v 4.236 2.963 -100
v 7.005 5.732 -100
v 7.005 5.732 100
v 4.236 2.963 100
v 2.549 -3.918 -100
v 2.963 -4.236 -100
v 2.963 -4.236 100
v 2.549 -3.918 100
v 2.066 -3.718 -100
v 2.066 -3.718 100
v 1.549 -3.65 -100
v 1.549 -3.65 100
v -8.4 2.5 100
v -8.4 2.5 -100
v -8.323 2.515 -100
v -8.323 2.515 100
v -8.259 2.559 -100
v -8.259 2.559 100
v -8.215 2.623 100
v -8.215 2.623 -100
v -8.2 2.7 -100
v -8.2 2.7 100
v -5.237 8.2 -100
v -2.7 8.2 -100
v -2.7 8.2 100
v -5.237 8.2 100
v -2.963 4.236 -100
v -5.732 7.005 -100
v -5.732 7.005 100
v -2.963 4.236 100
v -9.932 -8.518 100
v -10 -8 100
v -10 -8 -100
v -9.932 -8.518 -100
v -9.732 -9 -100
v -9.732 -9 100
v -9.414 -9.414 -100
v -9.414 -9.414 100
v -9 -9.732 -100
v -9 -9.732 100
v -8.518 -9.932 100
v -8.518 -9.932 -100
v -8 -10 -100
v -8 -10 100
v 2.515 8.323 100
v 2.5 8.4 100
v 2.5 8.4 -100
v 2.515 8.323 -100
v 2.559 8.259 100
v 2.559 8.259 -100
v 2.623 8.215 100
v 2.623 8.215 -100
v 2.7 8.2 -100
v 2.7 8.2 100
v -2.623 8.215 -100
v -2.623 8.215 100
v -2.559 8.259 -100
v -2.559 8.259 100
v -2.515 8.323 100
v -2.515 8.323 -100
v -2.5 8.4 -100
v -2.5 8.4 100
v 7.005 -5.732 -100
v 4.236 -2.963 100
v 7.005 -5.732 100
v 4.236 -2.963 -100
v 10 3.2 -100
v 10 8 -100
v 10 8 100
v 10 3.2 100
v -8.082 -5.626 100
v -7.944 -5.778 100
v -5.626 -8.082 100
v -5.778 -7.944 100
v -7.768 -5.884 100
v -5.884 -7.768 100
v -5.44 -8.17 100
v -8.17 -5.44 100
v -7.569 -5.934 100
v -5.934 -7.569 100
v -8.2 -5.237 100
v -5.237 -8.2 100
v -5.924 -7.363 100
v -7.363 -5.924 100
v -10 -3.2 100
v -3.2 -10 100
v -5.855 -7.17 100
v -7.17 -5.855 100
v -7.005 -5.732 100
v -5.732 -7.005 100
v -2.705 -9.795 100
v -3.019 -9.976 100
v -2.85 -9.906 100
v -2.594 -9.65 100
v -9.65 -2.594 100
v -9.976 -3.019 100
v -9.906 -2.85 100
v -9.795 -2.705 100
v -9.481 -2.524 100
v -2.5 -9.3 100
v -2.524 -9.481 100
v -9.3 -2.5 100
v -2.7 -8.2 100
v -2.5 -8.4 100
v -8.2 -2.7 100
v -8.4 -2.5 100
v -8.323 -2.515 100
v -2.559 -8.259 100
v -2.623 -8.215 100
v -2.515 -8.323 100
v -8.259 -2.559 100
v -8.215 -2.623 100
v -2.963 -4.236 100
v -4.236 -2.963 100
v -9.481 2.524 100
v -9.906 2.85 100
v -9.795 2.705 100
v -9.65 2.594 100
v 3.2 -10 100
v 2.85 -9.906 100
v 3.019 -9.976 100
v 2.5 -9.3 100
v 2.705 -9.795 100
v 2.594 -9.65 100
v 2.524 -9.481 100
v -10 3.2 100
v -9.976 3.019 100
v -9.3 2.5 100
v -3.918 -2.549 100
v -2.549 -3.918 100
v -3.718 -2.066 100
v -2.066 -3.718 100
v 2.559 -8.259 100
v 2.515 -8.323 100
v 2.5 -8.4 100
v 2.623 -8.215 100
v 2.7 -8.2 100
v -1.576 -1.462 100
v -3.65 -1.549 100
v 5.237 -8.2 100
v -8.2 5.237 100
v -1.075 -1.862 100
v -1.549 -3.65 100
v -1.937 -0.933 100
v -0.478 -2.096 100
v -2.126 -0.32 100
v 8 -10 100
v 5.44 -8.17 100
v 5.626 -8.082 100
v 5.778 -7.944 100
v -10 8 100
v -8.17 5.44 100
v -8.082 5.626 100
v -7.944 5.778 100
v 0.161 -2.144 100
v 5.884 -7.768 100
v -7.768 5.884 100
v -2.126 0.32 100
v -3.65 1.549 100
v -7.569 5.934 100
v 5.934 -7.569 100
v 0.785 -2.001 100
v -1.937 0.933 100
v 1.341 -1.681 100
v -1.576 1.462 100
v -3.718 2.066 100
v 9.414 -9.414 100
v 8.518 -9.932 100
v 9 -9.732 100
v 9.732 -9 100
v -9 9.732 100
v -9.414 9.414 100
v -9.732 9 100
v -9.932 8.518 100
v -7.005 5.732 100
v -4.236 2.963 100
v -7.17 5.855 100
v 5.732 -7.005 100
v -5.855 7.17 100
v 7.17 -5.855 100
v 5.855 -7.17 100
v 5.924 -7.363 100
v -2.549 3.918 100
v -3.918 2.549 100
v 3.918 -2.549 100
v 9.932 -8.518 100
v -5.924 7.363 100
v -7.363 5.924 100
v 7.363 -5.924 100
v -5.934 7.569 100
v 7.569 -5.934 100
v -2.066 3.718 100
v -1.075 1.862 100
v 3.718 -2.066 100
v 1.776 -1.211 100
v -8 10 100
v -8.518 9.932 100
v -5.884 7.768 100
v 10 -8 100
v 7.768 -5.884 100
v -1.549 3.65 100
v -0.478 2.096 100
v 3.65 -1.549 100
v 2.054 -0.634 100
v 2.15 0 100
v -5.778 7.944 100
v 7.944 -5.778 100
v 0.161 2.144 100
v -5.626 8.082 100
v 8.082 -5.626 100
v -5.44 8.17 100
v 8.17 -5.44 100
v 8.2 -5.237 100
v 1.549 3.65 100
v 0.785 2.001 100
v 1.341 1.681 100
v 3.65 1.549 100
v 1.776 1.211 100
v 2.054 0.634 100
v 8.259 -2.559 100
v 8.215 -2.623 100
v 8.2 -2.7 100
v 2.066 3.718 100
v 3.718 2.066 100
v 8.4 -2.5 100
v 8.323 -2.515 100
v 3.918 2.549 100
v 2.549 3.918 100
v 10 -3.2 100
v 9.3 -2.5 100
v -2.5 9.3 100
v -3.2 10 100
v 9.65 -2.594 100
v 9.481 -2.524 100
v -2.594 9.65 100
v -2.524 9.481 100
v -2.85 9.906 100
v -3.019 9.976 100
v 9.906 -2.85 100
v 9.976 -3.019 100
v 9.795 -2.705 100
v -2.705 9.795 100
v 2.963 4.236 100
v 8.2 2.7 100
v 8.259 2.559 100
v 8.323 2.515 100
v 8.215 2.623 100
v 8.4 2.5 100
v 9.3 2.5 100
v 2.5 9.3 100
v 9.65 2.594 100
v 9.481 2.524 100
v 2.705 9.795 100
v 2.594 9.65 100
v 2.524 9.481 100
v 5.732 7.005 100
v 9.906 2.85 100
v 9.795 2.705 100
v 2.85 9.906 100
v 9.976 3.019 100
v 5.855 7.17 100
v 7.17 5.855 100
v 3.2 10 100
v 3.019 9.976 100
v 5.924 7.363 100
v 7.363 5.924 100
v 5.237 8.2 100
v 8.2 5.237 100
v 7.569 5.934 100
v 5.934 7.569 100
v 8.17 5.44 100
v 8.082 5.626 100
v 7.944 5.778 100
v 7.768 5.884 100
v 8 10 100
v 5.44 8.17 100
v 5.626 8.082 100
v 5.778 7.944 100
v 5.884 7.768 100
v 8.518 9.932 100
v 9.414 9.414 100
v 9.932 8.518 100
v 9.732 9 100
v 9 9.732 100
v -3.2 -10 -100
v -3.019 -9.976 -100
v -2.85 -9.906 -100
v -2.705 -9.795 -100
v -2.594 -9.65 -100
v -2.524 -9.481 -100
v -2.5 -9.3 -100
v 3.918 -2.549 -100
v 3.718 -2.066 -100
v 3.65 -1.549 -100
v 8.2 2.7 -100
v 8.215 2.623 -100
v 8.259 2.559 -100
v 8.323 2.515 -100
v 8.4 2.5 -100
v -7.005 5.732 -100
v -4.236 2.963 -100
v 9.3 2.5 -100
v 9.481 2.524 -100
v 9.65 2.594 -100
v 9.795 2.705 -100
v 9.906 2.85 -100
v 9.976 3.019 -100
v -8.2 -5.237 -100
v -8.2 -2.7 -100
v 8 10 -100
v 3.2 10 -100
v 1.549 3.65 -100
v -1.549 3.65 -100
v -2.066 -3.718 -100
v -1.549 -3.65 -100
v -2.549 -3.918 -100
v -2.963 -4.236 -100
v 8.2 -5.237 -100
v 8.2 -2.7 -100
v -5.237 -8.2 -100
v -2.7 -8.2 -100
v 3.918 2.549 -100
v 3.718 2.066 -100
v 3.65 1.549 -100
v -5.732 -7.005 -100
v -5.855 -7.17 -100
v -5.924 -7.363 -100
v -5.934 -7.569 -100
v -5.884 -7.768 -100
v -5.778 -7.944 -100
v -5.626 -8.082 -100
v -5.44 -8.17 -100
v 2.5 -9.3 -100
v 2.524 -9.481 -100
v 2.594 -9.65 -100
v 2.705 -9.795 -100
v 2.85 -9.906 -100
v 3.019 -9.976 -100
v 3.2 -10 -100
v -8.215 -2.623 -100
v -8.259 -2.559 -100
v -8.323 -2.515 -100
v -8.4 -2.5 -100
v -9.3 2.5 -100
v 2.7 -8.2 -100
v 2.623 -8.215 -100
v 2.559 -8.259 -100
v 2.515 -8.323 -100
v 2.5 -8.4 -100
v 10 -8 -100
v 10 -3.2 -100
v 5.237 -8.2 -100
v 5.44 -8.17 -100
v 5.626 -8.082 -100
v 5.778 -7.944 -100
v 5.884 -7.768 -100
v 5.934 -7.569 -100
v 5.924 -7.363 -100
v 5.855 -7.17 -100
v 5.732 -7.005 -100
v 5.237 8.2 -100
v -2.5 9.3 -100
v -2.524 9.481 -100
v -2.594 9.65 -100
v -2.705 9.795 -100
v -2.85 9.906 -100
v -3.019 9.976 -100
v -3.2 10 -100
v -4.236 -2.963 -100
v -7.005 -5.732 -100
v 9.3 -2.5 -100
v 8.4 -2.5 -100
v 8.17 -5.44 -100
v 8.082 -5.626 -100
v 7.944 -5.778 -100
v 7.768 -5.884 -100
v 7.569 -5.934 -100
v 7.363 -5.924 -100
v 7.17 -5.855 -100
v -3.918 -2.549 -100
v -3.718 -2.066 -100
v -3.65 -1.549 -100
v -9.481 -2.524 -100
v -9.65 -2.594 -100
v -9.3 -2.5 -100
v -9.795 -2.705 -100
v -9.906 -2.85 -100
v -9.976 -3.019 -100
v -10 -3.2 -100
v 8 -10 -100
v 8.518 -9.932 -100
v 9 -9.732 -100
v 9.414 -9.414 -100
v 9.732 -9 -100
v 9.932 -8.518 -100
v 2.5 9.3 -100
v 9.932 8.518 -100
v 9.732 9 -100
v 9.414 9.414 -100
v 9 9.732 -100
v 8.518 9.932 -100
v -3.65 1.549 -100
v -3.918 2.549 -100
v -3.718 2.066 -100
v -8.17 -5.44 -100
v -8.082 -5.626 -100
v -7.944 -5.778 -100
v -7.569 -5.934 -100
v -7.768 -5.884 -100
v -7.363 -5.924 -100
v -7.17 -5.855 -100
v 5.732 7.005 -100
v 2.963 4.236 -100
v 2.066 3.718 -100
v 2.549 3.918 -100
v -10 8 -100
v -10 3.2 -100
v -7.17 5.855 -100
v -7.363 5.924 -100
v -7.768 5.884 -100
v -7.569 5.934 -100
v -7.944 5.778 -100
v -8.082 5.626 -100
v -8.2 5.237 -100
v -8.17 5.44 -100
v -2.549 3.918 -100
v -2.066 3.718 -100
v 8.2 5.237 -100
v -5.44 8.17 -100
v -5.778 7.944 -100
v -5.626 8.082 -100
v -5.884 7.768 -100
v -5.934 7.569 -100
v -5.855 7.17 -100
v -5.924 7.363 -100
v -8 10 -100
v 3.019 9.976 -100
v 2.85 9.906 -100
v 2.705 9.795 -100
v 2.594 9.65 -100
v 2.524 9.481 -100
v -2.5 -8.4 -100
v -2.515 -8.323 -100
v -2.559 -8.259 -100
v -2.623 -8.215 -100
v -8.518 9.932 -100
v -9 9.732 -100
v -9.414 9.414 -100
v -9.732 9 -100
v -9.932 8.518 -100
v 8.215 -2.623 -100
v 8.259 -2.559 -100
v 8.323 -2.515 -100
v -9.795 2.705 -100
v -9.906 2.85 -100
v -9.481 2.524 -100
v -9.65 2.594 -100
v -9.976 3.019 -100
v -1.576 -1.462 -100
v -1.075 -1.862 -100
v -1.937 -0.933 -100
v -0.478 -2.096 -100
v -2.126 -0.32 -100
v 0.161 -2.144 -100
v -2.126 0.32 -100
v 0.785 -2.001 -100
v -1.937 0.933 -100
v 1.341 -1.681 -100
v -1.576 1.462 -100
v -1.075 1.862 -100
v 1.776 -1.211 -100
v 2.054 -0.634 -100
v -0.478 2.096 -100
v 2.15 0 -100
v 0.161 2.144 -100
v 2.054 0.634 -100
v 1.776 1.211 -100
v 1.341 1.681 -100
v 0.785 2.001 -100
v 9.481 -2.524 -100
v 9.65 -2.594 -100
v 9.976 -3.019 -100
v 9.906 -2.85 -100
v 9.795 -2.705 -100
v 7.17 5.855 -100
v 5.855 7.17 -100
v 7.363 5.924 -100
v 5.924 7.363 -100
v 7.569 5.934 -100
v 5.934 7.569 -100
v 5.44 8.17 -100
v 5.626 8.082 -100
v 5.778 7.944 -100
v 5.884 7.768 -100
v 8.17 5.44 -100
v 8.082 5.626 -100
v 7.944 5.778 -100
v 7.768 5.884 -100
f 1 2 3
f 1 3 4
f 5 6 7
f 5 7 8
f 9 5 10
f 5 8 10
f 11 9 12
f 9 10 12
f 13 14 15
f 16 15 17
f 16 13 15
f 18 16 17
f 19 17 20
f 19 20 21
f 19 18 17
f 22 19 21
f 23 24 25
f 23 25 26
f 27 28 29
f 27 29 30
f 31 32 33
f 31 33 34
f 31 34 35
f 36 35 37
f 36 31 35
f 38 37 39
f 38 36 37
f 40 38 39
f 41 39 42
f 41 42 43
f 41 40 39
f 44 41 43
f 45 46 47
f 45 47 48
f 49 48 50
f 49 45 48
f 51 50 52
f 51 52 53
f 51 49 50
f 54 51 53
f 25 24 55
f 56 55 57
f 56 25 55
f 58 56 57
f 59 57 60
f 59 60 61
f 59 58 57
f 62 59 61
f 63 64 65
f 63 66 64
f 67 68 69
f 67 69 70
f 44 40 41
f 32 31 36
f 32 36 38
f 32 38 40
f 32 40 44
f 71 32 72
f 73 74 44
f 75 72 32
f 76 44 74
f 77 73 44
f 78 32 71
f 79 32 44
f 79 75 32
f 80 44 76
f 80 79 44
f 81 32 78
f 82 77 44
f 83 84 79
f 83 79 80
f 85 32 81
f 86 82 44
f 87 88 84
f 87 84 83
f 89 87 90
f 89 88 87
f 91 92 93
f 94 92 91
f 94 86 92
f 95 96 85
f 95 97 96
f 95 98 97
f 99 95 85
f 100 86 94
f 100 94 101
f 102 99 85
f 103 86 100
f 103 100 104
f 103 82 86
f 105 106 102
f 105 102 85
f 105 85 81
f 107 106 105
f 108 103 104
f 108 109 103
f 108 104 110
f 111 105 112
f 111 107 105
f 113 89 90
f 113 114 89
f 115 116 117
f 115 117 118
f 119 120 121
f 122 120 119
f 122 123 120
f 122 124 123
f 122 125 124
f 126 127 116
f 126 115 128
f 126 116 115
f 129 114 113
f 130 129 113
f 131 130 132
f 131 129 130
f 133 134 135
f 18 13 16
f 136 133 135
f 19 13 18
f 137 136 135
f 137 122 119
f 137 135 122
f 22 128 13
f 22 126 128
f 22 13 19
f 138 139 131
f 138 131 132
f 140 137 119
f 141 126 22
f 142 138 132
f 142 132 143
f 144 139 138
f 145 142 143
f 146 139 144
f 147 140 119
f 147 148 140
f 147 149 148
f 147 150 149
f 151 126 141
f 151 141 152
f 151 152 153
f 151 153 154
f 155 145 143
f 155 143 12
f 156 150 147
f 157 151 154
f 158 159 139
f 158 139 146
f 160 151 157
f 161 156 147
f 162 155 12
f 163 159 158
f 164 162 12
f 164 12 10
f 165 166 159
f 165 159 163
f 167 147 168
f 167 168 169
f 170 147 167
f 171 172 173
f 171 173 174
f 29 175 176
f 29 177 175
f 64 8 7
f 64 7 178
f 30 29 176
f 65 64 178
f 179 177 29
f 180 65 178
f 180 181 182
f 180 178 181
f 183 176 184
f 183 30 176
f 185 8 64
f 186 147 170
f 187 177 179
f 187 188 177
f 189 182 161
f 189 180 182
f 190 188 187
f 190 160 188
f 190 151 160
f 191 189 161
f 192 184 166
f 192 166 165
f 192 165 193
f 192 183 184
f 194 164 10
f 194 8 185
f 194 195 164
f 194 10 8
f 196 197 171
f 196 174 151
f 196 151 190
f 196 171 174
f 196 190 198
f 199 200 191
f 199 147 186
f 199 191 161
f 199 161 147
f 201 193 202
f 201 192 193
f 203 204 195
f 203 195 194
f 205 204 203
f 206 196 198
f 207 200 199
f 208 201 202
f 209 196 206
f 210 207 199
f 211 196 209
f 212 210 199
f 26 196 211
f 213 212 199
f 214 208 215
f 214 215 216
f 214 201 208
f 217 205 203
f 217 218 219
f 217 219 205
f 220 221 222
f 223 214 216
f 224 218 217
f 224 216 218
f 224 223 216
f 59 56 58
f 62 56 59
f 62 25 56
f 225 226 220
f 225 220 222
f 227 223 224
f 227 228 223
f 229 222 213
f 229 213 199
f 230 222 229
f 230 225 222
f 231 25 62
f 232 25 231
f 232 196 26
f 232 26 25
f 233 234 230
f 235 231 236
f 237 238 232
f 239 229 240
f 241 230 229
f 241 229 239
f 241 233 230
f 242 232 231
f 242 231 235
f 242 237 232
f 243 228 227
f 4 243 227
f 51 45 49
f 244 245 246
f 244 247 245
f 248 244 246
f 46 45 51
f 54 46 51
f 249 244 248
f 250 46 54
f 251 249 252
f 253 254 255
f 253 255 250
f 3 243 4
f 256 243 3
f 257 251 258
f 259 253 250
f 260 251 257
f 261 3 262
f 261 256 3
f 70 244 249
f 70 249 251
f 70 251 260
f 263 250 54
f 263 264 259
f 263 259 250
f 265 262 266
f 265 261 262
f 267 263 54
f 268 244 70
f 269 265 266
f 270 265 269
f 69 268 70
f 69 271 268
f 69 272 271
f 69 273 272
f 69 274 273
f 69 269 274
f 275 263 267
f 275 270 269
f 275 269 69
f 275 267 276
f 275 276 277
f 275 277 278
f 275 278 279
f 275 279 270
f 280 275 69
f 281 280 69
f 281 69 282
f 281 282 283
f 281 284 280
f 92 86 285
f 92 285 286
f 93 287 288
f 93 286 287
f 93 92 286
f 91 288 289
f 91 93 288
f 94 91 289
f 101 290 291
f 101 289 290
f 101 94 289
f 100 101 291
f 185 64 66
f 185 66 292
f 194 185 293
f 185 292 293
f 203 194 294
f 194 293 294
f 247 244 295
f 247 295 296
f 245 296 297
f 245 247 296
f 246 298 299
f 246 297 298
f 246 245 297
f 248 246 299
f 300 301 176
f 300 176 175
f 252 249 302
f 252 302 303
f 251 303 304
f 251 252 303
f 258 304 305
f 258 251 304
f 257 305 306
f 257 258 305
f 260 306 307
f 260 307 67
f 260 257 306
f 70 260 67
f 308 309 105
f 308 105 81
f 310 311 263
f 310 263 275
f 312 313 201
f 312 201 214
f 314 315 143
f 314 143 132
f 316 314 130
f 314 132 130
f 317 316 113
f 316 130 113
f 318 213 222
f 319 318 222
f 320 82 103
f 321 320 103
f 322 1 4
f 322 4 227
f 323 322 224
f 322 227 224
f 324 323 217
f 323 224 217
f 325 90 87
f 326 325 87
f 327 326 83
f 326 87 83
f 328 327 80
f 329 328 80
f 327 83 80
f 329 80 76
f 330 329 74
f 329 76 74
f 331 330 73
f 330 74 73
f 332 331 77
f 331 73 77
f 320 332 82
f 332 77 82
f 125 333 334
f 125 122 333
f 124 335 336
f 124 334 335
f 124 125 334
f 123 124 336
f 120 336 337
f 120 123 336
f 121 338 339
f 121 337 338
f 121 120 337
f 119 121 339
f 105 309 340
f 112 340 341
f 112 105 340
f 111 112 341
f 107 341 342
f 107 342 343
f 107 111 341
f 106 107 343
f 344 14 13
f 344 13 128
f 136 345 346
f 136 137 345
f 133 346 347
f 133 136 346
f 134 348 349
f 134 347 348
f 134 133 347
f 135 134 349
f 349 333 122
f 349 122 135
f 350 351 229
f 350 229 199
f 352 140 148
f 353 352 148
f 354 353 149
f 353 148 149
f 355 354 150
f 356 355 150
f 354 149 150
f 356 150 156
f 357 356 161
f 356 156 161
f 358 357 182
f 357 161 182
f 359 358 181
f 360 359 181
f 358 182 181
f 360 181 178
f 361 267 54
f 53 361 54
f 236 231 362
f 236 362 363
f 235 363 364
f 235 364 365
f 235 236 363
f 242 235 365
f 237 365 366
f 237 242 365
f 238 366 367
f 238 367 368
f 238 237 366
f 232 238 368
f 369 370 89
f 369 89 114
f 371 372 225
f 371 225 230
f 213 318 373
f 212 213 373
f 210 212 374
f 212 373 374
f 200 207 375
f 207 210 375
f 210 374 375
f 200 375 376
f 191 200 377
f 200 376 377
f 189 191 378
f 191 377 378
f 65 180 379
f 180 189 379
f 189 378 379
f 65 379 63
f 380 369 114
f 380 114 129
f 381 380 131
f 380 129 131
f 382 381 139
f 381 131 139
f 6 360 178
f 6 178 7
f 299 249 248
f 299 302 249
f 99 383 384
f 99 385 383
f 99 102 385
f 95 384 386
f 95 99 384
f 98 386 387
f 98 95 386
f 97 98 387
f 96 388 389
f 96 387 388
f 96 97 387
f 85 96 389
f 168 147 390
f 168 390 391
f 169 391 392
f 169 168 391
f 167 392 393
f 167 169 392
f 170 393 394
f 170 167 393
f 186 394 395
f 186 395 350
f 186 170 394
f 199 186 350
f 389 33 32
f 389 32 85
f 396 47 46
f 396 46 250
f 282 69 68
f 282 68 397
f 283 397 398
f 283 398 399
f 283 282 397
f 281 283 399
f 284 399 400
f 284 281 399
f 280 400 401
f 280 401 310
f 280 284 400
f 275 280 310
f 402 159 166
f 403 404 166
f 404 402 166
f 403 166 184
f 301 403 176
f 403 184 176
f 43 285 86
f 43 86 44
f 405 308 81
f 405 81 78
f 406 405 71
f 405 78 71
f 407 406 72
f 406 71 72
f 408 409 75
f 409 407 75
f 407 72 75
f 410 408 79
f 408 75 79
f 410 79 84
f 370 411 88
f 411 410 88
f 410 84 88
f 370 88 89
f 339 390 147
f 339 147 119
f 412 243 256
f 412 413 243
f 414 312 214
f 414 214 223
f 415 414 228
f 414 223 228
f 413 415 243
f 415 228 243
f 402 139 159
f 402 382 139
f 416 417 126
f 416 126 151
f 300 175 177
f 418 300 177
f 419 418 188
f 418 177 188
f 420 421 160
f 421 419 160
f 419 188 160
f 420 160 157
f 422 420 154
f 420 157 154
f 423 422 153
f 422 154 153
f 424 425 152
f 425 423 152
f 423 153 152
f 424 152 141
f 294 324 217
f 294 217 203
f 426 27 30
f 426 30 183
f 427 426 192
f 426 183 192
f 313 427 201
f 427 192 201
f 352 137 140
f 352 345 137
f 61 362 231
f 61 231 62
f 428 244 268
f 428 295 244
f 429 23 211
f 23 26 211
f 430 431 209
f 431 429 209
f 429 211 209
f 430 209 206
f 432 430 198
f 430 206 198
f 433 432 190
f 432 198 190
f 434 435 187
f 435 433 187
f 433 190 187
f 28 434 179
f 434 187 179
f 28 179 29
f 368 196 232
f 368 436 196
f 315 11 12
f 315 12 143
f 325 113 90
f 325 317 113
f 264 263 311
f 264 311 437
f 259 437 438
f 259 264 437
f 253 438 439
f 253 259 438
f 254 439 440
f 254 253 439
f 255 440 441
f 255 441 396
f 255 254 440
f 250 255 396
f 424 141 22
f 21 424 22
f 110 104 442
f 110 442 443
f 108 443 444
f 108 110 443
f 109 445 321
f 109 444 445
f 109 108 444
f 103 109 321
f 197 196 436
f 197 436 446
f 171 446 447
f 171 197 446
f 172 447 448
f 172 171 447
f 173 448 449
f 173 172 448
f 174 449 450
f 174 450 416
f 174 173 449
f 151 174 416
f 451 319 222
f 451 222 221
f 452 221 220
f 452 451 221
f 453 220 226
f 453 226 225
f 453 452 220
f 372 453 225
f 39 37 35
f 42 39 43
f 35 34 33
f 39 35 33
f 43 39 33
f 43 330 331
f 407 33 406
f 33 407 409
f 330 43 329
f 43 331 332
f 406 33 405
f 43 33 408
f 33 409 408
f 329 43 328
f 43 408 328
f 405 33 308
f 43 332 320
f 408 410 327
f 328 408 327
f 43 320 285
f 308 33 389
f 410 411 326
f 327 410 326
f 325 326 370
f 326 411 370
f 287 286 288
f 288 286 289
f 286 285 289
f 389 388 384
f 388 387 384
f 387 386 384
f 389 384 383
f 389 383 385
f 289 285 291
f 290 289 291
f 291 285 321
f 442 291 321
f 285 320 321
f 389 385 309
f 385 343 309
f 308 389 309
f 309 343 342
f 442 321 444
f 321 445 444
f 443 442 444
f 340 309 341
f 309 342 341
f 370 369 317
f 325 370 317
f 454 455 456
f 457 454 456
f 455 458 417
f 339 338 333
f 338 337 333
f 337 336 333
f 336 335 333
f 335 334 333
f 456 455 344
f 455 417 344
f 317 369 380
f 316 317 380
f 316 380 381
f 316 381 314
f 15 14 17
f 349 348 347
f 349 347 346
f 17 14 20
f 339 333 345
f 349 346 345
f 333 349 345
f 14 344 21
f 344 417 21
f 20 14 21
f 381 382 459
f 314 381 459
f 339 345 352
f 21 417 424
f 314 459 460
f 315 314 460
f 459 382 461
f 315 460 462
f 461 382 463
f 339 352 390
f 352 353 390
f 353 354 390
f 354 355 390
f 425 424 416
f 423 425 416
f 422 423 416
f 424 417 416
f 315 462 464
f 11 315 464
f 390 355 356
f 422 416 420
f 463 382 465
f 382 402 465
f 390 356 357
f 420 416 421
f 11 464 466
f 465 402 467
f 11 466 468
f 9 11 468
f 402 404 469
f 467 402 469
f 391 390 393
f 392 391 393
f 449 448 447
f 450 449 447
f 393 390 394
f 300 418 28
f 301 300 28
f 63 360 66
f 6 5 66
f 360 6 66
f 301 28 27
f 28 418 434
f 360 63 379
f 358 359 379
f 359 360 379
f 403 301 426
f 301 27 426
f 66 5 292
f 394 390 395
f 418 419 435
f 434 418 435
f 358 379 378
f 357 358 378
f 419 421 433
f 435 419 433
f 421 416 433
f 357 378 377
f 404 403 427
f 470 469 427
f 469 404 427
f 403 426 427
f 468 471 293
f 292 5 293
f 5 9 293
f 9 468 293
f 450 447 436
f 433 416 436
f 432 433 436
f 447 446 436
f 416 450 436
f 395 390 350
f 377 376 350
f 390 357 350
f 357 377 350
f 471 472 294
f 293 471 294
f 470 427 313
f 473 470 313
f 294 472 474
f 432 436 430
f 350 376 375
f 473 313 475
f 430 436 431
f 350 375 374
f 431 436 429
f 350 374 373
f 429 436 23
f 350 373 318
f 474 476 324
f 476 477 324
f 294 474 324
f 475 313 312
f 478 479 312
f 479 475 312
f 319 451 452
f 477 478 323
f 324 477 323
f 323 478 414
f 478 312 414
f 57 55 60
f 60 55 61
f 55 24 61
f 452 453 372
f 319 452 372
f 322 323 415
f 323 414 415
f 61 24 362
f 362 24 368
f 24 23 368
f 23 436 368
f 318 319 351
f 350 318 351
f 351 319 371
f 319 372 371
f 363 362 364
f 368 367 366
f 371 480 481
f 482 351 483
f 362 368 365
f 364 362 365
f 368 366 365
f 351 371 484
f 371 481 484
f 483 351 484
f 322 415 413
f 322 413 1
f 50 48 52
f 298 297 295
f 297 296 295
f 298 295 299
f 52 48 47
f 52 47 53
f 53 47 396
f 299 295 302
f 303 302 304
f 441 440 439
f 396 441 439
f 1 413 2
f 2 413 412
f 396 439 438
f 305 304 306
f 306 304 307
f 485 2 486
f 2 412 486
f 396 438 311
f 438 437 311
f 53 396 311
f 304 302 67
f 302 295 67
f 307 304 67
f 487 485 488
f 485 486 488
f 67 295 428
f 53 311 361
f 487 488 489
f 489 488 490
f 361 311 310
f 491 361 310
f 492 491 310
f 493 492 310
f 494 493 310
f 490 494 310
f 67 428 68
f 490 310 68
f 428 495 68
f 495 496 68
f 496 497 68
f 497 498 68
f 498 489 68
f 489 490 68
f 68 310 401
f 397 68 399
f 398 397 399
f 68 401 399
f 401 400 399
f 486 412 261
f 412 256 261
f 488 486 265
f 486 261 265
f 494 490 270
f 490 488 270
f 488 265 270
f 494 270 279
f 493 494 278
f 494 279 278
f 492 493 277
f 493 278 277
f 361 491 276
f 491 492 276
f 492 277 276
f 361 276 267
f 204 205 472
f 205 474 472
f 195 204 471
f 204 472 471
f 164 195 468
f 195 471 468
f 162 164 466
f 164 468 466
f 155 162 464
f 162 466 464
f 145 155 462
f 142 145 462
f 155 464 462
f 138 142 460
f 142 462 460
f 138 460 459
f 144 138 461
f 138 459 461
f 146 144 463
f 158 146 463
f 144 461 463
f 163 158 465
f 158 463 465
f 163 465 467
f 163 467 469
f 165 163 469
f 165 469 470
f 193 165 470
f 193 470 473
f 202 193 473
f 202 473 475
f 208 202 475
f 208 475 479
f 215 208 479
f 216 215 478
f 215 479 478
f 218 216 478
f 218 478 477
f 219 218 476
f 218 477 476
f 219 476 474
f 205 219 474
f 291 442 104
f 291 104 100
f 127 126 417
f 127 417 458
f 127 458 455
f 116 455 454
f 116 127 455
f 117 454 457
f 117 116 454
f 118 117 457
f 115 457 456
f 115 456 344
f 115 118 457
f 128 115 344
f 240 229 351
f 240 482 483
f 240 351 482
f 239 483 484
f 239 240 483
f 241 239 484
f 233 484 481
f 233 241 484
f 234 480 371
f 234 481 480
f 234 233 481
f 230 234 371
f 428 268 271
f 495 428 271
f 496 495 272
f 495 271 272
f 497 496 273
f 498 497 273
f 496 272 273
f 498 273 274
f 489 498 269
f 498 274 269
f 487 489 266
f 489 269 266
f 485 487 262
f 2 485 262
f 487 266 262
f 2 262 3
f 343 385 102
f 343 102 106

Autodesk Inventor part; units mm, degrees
ref_plane "YZ Plane" through (0, 0, 0) normal (1, 0, 0) x (0, 1, 0)
ref_plane "XZ Plane" through (0, 0, 0) normal (0, 1, 0) x (-1, 0, 0)
ref_plane "XY Plane" through (0, 0, 0) normal (0, 0, 1) x (1, 0, 0)
sketch "Sketch1" plane through (0, 0, 0) normal (0, 0, 1) x (1, 0, 0)
  circle A0 centre (0, 0) radius 2.15
  line L0 (-10, 10) -> (-2.5, 10)
  line L1 (-2.5, 10) -> (-2.5, 8.2)
  line L2 (-2.5, 8.2) -> (-6.9272, 8.2)
  line L3 (-6.9272, 8.2) -> (-2.3772, 3.65)
  line L4 (-2.3772, 3.65) -> (2.3772, 3.65)
  line L5 (2.3772, 3.65) -> (6.9272, 8.2)
  line L6 (6.9272, 8.2) -> (2.5, 8.2)
  line L7 (2.5, 8.2) -> (2.5, 10)
  line L8 (2.5, 10) -> (10, 10)
  line L9 (10, 10) -> (10, 2.5)
  line L10 (10, 2.5) -> (8.2, 2.5)
  line L11 (8.2, 2.5) -> (8.2, 6.9272)
  line L12 (8.2, 6.9272) -> (3.65, 2.3772)
  line L13 (3.65, 2.3772) -> (3.65, -2.3772)
  line L14 (3.65, -2.3772) -> (8.2, -6.9272)
  line L15 (8.2, -6.9272) -> (8.2, -2.5)
  line L16 (8.2, -2.5) -> (10, -2.5)
  line L17 (10, -2.5) -> (10, -10)
  line L18 (10, -10) -> (2.5, -10)
  line L19 (2.5, -10) -> (2.5, -8.2)
  line L20 (2.5, -8.2) -> (6.9272, -8.2)
  line L21 (6.9272, -8.2) -> (2.3772, -3.65)
  line L22 (2.3772, -3.65) -> (-2.3772, -3.65)
  line L23 (-2.3772, -3.65) -> (-6.9272, -8.2)
  line L24 (-6.9272, -8.2) -> (-2.5, -8.2)
  line L25 (-2.5, -8.2) -> (-2.5, -10)
  line L26 (-2.5, -10) -> (-10, -10)
  line L27 (-10, -10) -> (-10, -2.5)
  line L28 (-10, -2.5) -> (-8.2, -2.5)
  line L29 (-8.2, -2.5) -> (-8.2, -6.9272)
  line L30 (-8.2, -6.9272) -> (-3.65, -2.3772)
  line L31 (-3.65, -2.3772) -> (-3.65, 2.3772)
  line L32 (-3.65, 2.3772) -> (-8.2, 6.9272)
  line L33 (-8.2, 6.9272) -> (-8.2, 2.5)
  line L34 (-8.2, 2.5) -> (-10, 2.5)
  line L35 (-10, 2.5) -> (-10, 10)
  line L36 (0, 0) -> (-30.8654, 30.8654)
  line L37 (0, 0) -> (30.8654, 30.8654)
  line L38 (0, 0) -> (42.5392, 0)
  line L39 (0, 0) -> (0, 44.3419)
  dimension "d0" = 45
  dimension "d1" = 90
  dimension "Breite" = 20
  dimension "Tiefe_Schiene" = 6.35
  dimension "d2" = 1.8
  dimension "Durchmesser_Loch" = 4.3
  dimension "Wandstaerke" = 1.8
  dimension "d3" = 1.8
  dimension "Breite_Schiene" = 5
  dimension "d4" = 5
extrude "Extrusion1" add sketch "Sketch1" along normal mid plane 200 contours L38 L13 L14 L15 L16 L17 L18 L19 L20 L21 L22 L23 L24 L25 L26 L27 L28 L29 L30 L31 L32 L33 L34 L35 L36 A0 | A0 L37 L9 L10 L11 L12 L13 L38 | A0 L39 L4 L5 L6 L7 L8 L37 | L36 L0 L1 L2 L3 L4 L39 A0
fillet "Fillet1" radius 2 4 edges at (10, 10, 0) (-10, 10, 0) (10, -10, 0) (-10, -10, 0)
fillet "Fillet2" radius 0.2 8 edges at (-2.5, 8.2, 0) (2.5, 8.2, 0) (8.2, 2.5, 0) (8.2, -2.5, 0) (-2.5, -8.2, 0) (-8.2, -2.5, 0) (-8.2, 2.5, 0) (2.5, -8.2, 0)
fillet "Fillet3" radius 0.7 16 edges at (-2.5, 10, 0) (2.5, 10, 0) (10, 2.5, 0) (10, -2.5, 0) (2.5, -10, 0) (-2.5, -10, 0) (-10, -2.5, 0) (-10, 2.5, 0) (-6.9272, -8.2, 0) (-8.2, -6.9272, 0) (6.9272, -8.2, 0) (8.2, -6.9272, 0) (8.2, 6.9272, 0) (6.9272, 8.2, 0) (-6.9272, 8.2, 0) (-8.2, 6.9272, 0)
fillet "Fillet4" radius 2 8 edges at (-3.65, 2.3772, 0) (-2.3772, 3.65, 0) (2.3772, 3.65, 0) (3.65, 2.3772, 0) (3.65, -2.3772, 0) (2.3772, -3.65, 0) (-2.3772, -3.65, 0) (-3.65, -2.3772, 0)
equation "\"d2\" = Wandstaerke"
equation "\"d3\" = Wandstaerke"
equation "\"d4\" = Breite_Schiene"
properties part number "503.025.01_ITEM_20x20_200mm"
